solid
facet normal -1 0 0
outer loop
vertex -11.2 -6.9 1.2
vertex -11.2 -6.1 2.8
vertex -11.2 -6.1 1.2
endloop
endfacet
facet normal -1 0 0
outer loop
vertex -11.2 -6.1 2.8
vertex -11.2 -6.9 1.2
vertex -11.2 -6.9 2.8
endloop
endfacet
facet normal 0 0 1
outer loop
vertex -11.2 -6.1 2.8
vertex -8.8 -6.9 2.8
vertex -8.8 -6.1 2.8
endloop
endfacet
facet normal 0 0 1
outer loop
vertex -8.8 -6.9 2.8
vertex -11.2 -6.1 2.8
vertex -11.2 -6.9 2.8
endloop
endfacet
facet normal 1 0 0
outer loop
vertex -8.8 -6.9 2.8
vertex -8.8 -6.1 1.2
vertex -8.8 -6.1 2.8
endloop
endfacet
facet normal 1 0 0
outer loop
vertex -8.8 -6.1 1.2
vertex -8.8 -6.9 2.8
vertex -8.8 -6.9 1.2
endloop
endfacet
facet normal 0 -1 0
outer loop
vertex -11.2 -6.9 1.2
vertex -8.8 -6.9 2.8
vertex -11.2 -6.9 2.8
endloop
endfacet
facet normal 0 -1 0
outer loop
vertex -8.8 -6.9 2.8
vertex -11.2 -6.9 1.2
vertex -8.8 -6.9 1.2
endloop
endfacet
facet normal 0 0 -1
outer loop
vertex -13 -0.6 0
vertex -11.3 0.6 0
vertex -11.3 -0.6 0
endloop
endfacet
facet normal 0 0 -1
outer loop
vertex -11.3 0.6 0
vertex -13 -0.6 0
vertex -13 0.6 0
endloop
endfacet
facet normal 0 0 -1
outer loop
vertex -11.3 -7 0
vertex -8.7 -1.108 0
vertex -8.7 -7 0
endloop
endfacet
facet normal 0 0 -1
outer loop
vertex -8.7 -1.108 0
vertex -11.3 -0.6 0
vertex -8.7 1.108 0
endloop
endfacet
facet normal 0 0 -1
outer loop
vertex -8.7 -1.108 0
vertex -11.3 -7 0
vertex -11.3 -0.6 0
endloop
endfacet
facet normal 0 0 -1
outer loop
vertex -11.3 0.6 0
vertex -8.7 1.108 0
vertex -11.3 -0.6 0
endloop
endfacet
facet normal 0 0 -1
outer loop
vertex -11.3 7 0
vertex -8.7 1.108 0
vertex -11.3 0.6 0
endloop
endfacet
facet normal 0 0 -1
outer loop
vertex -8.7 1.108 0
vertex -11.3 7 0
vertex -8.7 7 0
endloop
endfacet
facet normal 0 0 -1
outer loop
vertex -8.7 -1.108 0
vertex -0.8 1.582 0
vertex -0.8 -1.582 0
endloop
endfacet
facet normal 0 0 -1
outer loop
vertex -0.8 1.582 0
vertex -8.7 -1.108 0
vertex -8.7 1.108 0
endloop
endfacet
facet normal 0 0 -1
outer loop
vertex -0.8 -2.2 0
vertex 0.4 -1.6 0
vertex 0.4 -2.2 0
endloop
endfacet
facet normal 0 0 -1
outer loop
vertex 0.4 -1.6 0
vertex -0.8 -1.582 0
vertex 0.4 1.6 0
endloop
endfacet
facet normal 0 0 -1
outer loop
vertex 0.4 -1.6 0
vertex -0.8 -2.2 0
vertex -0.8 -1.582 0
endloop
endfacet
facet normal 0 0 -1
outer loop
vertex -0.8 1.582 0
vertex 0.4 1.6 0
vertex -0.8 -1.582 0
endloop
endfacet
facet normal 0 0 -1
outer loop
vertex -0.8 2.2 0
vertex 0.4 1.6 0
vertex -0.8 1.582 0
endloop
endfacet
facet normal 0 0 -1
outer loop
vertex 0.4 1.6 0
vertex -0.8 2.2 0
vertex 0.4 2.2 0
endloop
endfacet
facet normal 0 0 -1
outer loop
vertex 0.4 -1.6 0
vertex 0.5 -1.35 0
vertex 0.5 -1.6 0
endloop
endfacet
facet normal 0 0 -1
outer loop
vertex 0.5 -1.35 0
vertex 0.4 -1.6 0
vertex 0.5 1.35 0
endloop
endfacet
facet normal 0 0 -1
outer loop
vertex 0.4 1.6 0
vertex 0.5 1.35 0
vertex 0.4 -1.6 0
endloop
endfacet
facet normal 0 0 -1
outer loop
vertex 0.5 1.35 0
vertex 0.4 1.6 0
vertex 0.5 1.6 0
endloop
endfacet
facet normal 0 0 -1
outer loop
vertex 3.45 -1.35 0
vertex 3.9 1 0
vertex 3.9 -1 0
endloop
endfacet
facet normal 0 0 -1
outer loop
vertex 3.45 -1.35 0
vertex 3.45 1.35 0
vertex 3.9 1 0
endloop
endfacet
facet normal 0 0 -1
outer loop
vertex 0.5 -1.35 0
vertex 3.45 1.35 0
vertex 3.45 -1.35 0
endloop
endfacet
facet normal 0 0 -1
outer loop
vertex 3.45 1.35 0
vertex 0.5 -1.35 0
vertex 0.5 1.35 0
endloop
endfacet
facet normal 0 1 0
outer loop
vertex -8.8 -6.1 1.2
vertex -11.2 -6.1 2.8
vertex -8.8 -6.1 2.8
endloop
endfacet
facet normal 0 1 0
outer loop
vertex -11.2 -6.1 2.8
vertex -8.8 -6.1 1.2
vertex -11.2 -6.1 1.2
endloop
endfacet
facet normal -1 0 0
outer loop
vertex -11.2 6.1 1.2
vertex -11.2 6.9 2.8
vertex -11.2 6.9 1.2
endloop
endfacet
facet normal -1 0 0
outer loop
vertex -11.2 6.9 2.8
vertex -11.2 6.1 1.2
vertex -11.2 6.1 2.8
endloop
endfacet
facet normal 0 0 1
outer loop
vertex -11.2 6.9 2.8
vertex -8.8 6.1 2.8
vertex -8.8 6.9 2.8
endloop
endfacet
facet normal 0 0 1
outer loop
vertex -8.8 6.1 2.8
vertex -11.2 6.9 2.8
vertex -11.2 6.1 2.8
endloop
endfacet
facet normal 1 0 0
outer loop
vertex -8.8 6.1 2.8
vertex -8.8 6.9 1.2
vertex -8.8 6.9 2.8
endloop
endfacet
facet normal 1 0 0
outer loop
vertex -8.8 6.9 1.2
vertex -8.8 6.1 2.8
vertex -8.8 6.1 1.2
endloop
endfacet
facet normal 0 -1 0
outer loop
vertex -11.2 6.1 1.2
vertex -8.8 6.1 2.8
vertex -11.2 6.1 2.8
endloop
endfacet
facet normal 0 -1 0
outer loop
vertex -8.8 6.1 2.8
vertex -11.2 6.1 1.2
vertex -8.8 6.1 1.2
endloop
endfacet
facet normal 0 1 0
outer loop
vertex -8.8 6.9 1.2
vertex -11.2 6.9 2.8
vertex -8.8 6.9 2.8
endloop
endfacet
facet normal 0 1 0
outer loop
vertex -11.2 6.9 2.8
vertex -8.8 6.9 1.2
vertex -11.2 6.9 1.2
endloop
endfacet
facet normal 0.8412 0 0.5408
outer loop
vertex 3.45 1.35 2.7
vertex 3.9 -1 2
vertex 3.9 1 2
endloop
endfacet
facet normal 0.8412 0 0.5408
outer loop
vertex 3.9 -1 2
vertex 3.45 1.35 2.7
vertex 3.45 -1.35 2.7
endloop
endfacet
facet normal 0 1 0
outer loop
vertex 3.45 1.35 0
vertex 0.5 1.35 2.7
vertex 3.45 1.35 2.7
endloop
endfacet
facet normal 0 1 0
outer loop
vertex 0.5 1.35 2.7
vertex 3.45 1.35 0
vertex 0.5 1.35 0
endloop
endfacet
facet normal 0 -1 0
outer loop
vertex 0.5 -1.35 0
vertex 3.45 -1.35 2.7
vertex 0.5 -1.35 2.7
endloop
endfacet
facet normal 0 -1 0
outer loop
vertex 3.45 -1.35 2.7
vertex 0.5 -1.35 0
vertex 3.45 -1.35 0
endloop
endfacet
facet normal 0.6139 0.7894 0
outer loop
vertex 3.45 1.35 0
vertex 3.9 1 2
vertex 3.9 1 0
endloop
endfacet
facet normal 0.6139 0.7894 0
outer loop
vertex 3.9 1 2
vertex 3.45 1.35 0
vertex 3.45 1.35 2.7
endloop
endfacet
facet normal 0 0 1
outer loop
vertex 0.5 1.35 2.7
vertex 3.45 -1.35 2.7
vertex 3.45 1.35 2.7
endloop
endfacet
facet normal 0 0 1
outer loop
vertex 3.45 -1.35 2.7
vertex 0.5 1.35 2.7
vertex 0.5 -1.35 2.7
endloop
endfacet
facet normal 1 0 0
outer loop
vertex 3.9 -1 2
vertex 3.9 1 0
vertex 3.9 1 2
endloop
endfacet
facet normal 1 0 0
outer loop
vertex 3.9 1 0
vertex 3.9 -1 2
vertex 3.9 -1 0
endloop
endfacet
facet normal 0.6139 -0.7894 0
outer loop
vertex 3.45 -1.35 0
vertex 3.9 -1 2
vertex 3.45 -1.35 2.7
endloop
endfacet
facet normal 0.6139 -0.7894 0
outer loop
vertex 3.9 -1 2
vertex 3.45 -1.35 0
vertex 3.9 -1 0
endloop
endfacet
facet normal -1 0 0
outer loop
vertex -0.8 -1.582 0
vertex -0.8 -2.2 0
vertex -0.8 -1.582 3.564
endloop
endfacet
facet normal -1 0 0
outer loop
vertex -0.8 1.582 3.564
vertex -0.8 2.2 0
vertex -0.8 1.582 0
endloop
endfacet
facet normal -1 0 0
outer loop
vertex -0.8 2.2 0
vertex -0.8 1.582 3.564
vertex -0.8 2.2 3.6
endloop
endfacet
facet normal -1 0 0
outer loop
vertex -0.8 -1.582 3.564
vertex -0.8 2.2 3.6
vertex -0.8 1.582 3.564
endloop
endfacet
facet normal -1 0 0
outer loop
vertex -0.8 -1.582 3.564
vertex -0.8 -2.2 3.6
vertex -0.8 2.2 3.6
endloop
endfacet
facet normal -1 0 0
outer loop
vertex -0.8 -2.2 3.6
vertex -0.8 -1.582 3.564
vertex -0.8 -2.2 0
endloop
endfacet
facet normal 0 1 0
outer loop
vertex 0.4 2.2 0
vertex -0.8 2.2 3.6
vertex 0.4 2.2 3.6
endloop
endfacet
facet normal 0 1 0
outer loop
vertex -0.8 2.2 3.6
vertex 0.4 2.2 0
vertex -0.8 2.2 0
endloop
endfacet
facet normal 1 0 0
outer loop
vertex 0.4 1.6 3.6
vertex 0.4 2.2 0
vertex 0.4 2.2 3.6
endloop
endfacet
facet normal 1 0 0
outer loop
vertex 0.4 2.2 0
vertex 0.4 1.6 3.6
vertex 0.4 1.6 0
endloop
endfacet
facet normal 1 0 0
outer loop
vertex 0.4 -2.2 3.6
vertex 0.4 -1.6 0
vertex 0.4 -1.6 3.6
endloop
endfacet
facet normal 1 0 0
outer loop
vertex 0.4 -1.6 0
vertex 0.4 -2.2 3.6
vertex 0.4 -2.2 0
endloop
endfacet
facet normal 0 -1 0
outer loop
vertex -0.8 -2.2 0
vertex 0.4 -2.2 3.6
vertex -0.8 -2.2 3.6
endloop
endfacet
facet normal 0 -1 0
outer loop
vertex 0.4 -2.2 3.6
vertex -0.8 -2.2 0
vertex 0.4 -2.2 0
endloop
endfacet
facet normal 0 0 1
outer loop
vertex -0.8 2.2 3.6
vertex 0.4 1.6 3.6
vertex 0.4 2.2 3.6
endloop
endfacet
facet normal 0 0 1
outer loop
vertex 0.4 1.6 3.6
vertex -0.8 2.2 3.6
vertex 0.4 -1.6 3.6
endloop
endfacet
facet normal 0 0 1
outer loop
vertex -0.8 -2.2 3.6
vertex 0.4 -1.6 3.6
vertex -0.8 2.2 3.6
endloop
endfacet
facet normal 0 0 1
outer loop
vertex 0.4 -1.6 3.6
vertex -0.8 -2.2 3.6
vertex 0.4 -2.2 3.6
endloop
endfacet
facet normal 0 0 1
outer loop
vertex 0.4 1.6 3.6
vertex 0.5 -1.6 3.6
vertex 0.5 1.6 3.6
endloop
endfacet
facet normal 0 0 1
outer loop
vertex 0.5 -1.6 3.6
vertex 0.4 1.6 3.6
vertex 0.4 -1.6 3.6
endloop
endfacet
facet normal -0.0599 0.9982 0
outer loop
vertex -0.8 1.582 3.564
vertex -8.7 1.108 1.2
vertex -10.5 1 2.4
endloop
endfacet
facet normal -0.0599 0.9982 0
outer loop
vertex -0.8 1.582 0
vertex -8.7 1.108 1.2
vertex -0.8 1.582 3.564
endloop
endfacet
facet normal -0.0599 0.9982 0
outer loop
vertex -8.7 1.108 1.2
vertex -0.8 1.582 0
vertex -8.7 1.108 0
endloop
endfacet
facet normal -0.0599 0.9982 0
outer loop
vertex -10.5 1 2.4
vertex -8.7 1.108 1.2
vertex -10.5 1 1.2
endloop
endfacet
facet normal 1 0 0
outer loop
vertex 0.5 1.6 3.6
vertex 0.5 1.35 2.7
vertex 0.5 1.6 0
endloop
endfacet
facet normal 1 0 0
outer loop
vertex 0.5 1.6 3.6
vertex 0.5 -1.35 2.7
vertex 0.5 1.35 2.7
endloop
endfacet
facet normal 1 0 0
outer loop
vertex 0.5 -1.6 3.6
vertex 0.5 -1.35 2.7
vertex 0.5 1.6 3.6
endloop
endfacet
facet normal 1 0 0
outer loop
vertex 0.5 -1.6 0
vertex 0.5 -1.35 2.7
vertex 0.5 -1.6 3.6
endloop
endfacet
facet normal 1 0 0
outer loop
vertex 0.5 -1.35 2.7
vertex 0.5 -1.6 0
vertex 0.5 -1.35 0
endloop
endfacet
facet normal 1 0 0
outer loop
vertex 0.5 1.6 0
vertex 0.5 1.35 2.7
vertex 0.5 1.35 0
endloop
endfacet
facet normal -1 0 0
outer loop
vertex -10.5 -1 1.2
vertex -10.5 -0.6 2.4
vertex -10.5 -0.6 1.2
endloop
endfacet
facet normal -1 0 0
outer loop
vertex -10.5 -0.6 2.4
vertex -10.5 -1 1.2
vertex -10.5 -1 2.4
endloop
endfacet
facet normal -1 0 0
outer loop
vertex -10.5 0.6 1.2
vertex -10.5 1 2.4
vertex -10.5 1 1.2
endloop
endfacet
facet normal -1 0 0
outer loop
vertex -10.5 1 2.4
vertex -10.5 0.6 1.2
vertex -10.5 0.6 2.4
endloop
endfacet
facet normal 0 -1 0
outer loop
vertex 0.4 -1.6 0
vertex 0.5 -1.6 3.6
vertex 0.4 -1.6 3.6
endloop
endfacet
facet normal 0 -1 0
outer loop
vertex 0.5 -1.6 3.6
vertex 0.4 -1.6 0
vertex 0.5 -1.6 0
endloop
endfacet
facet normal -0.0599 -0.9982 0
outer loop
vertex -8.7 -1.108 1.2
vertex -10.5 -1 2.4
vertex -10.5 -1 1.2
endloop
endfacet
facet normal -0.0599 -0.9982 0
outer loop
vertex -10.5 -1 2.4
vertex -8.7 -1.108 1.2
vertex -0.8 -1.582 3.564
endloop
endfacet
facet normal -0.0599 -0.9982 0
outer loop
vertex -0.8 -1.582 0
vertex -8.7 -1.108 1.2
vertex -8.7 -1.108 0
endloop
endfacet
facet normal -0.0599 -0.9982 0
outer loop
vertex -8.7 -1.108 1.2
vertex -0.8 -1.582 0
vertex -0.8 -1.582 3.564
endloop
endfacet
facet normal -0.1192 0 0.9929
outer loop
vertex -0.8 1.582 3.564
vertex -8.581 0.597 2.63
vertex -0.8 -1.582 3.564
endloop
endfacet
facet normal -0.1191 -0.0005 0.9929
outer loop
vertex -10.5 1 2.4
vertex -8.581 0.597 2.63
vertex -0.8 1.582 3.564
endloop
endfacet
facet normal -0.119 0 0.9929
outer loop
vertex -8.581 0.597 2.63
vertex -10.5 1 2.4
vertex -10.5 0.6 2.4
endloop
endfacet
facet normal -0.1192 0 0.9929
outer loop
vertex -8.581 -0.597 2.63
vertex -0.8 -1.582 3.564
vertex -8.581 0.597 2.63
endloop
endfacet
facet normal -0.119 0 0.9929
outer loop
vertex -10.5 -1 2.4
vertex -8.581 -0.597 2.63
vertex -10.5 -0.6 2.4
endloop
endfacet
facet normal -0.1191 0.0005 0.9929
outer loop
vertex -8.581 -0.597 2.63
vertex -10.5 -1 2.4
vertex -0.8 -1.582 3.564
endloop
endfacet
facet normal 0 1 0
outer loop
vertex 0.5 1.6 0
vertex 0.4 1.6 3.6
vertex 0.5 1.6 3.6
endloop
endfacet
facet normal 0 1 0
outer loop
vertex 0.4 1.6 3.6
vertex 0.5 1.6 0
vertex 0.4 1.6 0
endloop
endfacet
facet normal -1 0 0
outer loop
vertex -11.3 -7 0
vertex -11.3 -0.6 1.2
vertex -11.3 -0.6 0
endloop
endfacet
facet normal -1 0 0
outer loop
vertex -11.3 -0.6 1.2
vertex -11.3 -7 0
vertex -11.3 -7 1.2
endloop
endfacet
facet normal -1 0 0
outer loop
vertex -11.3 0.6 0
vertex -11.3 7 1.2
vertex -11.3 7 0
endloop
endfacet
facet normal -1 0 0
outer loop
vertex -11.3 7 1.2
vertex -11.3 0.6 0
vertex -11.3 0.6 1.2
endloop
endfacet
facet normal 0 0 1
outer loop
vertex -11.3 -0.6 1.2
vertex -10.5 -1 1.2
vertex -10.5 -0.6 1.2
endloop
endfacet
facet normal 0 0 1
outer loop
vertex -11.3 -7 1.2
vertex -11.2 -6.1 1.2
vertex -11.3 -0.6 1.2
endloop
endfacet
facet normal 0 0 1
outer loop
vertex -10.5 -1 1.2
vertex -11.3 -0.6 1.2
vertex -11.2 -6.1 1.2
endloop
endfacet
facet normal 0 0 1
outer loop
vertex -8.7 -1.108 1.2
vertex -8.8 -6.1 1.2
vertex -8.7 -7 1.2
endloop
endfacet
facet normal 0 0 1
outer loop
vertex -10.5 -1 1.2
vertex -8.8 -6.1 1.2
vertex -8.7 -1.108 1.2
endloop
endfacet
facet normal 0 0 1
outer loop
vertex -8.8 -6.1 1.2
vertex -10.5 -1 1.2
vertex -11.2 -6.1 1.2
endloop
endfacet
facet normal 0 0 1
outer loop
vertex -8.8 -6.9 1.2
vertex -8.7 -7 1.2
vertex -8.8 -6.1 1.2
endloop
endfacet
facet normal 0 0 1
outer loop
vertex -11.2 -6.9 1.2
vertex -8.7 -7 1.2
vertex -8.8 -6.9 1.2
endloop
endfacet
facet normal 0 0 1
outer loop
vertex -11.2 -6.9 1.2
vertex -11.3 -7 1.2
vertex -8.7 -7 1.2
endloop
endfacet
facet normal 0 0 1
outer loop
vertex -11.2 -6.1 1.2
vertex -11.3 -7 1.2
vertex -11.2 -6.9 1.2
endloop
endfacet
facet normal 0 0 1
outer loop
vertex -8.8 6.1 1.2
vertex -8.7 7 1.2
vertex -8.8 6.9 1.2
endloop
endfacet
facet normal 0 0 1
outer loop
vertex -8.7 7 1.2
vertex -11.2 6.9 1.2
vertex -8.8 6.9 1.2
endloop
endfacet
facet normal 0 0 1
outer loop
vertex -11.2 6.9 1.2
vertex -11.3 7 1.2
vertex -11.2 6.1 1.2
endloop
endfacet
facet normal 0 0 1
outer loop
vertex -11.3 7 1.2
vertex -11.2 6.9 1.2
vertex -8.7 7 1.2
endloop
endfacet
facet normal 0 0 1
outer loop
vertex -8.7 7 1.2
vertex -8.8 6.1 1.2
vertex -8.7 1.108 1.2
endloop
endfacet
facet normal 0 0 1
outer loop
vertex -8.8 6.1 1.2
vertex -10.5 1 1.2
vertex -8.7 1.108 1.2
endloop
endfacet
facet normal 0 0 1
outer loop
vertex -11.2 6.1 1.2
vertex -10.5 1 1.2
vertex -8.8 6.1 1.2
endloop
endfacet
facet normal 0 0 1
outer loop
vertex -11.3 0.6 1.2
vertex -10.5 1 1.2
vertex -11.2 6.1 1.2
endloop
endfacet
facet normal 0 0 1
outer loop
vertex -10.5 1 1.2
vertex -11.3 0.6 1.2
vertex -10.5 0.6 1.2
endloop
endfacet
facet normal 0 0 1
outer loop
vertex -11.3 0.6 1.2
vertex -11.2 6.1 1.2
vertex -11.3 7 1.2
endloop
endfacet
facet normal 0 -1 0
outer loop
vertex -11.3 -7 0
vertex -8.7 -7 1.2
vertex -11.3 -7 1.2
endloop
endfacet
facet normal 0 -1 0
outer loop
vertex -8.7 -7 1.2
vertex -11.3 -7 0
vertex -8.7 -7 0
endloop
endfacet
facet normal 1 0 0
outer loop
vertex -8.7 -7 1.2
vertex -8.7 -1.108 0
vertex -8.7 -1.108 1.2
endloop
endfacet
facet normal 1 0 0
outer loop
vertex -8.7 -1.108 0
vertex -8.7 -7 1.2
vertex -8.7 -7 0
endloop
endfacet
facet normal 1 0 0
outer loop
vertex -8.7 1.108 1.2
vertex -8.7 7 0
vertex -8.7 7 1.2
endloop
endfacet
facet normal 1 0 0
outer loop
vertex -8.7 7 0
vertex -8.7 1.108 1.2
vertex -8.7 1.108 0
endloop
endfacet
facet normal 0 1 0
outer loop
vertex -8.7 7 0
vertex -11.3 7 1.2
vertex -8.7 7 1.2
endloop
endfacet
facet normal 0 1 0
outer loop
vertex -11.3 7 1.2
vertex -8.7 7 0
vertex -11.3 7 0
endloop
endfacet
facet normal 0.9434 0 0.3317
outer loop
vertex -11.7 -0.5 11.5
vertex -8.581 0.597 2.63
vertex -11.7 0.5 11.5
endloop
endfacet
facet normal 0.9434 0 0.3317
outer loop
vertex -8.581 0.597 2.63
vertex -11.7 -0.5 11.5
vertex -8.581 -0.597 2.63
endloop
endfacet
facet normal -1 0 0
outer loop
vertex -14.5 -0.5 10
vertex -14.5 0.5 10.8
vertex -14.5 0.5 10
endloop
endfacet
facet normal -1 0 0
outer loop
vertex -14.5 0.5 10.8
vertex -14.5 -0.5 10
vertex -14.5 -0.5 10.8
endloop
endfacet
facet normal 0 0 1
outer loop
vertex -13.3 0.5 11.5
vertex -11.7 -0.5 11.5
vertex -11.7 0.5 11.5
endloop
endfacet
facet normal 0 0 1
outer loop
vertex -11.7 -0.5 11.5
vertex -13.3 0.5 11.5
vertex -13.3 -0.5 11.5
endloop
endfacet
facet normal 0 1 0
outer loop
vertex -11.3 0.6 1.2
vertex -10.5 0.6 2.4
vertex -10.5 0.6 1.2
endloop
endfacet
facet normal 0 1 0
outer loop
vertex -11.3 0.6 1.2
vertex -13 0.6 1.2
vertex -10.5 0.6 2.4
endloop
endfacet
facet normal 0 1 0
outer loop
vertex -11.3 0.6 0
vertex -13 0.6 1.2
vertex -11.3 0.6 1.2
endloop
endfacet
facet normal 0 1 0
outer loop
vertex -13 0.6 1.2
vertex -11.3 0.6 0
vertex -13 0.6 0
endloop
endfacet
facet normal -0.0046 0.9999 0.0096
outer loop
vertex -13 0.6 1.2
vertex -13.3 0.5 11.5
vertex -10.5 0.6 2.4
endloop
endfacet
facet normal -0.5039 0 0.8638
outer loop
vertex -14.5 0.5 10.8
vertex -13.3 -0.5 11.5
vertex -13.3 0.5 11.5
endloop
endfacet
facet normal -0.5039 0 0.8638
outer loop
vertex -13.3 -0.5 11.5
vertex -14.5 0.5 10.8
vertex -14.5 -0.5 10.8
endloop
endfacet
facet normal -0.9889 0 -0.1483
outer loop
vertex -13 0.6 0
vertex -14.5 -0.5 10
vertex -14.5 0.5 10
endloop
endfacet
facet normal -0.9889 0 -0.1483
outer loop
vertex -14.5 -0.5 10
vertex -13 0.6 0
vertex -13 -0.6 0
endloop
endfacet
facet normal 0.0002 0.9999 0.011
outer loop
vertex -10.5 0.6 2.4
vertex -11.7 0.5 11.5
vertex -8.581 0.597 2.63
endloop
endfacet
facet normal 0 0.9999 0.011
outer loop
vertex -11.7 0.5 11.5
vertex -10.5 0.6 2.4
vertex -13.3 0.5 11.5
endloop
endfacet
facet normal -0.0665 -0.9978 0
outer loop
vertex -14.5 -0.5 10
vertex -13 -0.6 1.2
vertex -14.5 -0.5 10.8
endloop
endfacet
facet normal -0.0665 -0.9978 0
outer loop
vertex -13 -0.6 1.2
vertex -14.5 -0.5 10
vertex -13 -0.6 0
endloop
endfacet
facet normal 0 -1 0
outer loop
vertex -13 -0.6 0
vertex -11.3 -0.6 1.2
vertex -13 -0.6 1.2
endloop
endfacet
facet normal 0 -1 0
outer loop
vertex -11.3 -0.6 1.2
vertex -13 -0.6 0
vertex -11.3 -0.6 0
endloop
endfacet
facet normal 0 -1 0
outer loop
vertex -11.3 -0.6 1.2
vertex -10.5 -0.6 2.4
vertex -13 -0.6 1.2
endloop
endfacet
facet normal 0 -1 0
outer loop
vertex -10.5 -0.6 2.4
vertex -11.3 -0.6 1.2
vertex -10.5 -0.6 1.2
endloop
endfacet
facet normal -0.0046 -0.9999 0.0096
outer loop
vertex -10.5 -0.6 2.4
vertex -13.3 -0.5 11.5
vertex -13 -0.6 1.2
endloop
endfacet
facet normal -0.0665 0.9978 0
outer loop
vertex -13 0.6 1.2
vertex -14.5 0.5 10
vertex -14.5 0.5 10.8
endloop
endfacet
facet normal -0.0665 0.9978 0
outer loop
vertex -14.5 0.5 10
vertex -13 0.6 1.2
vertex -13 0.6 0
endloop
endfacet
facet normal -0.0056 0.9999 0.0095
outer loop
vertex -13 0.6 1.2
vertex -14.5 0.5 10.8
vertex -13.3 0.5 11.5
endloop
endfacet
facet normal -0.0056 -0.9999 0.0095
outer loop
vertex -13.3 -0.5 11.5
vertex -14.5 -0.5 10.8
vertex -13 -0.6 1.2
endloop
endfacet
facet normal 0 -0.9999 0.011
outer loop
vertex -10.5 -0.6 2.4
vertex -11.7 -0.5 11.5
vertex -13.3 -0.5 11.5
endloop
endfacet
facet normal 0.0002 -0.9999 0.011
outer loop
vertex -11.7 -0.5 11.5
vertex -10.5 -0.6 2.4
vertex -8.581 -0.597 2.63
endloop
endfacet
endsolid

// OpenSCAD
// ====================================================================
// Pure Supportless Tail Boom - Solid Fin, 0 Overhangs > 45 deg
// ====================================================================

$fn = 36;

module pure_supportless_tail_boom() {
    difference() {
        union() {
            // 1. Male Connector Plug (Bottom 100% flat at Z = 0!)
            hull() {
                translate([0.0, 0, 1.35])
                    cube([0.5, 2.7, 2.7], center = true);
                translate([3.2, 0, 1.35])
                    cube([0.5, 2.7, 2.7], center = true);
                // Tip chamfer (ONLY top and side taper, bottom stays flat on Z = 0)
                translate([3.8, 0, 1.0])
                    cube([0.2, 2.0, 2.0], center = true);
            }

            // Bulkhead stop flange (X = 0)
            hull() {
                translate([0, 0, 1.8])
                    cube([0.8, 4.4, 3.6], center = true);
                translate([-0.6, 0, 1.8])
                    cube([0.4, 4.4, 3.6], center = true);
            }

            // 2. Tail Boom Spine (Continuous flat bed runner on Z = 0)
            hull() {
                translate([0, 0, 1.8])
                    cube([1.0, 3.2, 3.6], center = true);
                translate([-10.0, 0, 1.2])
                    cube([1.0, 2.0, 2.4], center = true);
            }

            // 3. Horizontal Stabilizer Wing (100% grounded flat on Z = 0)
            hull() {
                translate([-10.0, 0, 0.6])
                    cube([2.6, 14.0, 1.2], center = true);
                translate([-10.8, 0, 0.4])
                    cube([1.0, 13.0, 0.8], center = true);
            }
            // Endplate fins (rise vertically from wings, bottom on Z = 0)
            for (sy = [-1, 1]) {
                hull() {
                    translate([-10.0, sy * 6.5, 1.4])
                        cube([2.4, 0.8, 2.8], center = true);
                    translate([-10.6, sy * 6.5, 1.0])
                        cube([1.2, 0.8, 2.0], center = true);
                }
            }

            // 4. Swept Vertical Stabilizer Fin (Solid fin, 90° vertical rise)
            // Leading edge swept back at 45° (self-supporting)
            // Trailing edge vertical (0° overhang)
            hull() {
                translate([-9.5, 0, 1.2])
                    cube([2.0, 1.2, 2.4], center = true);
                translate([-12.5, 0, 11.0])
                    cube([1.6, 1.0, 1.0], center = true);
                translate([-14.0, 0, 10.4])
                    cube([1.0, 1.0, 0.8], center = true);
                translate([-12.0, 0, 0.6])
                    cube([2.0, 1.2, 1.2], center = true);
            }
        }

        // Bed trim plane at Z = 0
        translate([0, 0, -5.0])
            cube([40, 40, 10], center = true);
    }
}

pure_supportless_tail_boom();
